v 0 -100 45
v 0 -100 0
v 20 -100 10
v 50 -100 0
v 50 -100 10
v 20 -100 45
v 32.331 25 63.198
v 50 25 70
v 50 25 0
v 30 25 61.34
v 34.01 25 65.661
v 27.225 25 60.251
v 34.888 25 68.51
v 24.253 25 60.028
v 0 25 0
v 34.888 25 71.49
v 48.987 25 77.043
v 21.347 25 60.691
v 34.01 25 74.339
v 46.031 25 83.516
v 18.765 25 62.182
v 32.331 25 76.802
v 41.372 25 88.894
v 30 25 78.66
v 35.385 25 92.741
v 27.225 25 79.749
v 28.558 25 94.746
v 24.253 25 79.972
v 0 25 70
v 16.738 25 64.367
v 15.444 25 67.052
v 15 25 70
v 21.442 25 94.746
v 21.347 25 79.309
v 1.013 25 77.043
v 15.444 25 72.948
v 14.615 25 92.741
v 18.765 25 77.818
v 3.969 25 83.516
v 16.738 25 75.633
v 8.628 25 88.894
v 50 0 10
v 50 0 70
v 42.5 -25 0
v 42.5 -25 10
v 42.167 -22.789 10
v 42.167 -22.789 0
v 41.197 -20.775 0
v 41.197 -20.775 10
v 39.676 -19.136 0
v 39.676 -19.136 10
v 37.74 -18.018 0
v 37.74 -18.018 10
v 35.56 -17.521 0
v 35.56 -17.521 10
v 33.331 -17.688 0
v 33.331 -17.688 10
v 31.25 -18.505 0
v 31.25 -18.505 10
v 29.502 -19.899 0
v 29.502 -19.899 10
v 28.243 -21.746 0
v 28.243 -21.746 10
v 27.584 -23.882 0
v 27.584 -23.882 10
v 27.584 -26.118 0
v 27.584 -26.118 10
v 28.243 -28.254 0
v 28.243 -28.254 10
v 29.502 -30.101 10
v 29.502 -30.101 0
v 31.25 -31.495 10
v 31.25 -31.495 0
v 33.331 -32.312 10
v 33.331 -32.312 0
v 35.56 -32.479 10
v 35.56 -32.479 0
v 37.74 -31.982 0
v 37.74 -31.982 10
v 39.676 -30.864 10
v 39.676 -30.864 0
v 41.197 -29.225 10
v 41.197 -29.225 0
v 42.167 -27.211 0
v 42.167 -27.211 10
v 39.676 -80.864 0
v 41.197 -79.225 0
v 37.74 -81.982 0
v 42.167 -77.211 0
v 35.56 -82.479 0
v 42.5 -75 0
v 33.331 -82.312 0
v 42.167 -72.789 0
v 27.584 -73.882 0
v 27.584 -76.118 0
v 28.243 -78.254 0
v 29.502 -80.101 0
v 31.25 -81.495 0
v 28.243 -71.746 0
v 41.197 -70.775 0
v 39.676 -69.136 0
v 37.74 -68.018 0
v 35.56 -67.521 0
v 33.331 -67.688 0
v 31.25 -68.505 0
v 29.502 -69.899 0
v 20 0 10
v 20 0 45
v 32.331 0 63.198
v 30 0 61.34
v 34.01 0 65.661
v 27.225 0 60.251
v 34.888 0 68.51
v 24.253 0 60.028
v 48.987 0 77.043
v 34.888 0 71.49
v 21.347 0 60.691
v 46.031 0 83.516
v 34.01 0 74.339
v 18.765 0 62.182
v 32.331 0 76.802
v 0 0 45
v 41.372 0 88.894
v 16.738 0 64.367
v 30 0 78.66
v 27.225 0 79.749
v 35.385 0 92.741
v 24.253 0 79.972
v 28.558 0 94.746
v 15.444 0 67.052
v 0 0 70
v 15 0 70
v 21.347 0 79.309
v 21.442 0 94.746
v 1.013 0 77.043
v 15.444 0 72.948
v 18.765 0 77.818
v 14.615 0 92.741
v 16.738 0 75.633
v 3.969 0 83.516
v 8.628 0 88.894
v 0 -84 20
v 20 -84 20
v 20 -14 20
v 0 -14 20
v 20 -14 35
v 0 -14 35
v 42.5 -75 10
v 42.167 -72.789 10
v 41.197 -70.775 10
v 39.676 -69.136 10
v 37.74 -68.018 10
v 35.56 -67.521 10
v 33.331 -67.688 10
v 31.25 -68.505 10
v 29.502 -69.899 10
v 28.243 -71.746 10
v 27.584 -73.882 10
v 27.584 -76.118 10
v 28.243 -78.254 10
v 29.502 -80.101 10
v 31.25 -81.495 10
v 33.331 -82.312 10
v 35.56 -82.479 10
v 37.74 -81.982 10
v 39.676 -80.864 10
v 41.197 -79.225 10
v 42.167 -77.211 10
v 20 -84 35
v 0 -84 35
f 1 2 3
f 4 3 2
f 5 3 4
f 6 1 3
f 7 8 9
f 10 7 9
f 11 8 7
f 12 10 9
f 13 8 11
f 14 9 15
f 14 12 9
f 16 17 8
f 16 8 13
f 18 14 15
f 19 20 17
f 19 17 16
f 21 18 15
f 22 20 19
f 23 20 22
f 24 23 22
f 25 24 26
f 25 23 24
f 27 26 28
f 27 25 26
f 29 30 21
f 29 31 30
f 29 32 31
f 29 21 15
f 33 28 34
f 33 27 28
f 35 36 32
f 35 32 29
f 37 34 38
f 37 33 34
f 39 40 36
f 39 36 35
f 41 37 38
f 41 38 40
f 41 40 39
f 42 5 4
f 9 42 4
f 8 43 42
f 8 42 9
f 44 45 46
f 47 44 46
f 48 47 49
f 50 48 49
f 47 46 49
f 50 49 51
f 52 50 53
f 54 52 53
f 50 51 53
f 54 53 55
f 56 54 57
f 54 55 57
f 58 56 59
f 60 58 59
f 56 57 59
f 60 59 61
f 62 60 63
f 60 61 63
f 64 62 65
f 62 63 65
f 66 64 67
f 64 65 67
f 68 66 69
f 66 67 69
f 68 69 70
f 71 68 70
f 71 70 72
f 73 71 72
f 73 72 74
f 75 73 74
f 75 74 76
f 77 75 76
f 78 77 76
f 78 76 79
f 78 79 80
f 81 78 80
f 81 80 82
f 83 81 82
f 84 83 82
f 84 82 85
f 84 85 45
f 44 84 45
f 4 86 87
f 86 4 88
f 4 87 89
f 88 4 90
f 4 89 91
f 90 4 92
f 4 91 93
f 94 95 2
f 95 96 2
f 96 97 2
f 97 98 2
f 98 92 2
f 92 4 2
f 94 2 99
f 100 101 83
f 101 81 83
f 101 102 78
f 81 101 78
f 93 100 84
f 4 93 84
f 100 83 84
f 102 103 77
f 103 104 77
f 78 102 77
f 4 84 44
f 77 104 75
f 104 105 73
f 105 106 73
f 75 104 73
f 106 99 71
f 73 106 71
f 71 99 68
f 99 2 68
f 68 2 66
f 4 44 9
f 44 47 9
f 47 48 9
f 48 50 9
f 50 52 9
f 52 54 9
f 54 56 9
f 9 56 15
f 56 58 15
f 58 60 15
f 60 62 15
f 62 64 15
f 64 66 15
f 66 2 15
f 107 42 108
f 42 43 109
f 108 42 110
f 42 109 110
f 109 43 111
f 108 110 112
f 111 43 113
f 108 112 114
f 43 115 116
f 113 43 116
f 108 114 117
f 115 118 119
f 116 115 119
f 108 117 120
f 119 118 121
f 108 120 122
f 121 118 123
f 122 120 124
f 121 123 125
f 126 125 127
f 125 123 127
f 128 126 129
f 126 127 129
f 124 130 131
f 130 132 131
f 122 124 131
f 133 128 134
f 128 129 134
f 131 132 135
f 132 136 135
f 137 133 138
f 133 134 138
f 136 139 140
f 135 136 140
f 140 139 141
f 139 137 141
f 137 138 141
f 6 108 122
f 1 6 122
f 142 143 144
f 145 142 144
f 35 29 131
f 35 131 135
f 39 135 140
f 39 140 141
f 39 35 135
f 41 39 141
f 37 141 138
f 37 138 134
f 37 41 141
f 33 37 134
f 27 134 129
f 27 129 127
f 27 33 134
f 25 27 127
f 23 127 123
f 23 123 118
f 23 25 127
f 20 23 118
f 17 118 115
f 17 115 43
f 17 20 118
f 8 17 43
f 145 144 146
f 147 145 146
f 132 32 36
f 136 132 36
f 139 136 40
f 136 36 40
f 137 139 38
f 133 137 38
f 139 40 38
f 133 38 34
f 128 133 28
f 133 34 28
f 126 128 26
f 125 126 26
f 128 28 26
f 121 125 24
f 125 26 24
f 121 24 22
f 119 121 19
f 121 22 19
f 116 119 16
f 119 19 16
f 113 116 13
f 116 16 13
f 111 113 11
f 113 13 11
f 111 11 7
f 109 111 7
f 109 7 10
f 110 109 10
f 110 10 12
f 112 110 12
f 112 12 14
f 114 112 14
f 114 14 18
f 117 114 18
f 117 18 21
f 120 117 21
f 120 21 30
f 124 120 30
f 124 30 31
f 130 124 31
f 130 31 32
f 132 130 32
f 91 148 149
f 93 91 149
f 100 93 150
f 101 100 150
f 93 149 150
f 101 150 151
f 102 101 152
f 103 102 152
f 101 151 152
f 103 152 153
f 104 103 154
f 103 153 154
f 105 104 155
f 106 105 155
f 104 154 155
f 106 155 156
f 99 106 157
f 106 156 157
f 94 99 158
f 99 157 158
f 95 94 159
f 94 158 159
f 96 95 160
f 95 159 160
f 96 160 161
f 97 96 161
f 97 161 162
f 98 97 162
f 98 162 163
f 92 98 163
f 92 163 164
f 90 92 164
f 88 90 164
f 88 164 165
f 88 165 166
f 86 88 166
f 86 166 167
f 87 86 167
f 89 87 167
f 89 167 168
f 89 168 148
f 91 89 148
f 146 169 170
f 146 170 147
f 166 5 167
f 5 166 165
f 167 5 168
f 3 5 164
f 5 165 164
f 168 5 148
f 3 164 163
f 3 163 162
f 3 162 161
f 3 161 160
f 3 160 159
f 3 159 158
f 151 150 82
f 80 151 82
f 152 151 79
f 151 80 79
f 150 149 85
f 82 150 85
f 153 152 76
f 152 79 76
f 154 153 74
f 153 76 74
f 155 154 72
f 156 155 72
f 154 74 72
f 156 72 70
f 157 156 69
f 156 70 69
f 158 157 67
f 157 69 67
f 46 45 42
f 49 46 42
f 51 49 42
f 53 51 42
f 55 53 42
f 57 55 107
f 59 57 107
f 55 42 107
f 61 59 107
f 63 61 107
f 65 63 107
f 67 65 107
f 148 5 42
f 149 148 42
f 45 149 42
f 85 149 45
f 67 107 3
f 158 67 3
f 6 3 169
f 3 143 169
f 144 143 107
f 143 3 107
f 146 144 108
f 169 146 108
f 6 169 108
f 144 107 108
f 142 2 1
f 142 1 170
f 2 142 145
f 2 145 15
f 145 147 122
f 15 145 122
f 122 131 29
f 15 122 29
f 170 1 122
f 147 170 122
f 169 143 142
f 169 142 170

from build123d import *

# Parameters (mm, degrees)
F1_DEPTH  = 100
F2_W      = 70
F2_H      = 15
F3_DEPTH  = 25.4
F4_W      = 25
F4_H      = 70
F5_DEPTH  = 50
F7_DEPTH  = 25
F8_R      = 10
F9_DEPTH  = 25.4
F10_R     = 7.5
F11_DEPTH = 25.4


with BuildPart() as f1:
    # F0 (on Front) → F1 (new body)
    with BuildSketch(Plane.XZ):
        Polygon((20, 45), (0, 45), (0, 0), (50, 0), (50, 10), (20, 10), align=None)
    extrude(amount=F1_DEPTH)

    # F2 (on face) → F3 (cut)
    with BuildSketch(Plane.YZ.offset(20)):
        with Locations((-49, 27.5)):
            Rectangle(F2_W, F2_H)
    extrude(amount=-F3_DEPTH, mode=Mode.SUBTRACT)

    # F4 (on Right) → F5 (join)
    with BuildSketch(Plane.YZ):
        with Locations((12.5, 35)):
            Rectangle(F4_W, F4_H)
    extrude(amount=F5_DEPTH)

    # F6 (on face) → F7 (join)
    with BuildSketch(Plane(origin=(0, 25, 0), x_dir=(-1, 0, 0), z_dir=(0, 1, 0))):
        with BuildLine():
            ThreePointArc((0, 70), (-25, 95), (-50, 70))
            Line((-50, 70), (0, 70))
        make_face()
    extrude(amount=-F7_DEPTH)

    # F8 (on face) → F9 (cut)
    with BuildSketch(Plane(origin=(0, 25, 0), x_dir=(-1, 0, 0), z_dir=(0, 1, 0))):
        with Locations((-25, 70)):
            Circle(F8_R)
    extrude(amount=-F9_DEPTH, mode=Mode.SUBTRACT)

    # F10 (on face) → F11 (cut)
    with BuildSketch(Plane.XY.offset(10)):
        with Locations((35, -25)):
            Circle(F10_R)
        with Locations((35, -75)):
            Circle(F10_R)
    extrude(amount=-F11_DEPTH, mode=Mode.SUBTRACT)


solid = f1.part
